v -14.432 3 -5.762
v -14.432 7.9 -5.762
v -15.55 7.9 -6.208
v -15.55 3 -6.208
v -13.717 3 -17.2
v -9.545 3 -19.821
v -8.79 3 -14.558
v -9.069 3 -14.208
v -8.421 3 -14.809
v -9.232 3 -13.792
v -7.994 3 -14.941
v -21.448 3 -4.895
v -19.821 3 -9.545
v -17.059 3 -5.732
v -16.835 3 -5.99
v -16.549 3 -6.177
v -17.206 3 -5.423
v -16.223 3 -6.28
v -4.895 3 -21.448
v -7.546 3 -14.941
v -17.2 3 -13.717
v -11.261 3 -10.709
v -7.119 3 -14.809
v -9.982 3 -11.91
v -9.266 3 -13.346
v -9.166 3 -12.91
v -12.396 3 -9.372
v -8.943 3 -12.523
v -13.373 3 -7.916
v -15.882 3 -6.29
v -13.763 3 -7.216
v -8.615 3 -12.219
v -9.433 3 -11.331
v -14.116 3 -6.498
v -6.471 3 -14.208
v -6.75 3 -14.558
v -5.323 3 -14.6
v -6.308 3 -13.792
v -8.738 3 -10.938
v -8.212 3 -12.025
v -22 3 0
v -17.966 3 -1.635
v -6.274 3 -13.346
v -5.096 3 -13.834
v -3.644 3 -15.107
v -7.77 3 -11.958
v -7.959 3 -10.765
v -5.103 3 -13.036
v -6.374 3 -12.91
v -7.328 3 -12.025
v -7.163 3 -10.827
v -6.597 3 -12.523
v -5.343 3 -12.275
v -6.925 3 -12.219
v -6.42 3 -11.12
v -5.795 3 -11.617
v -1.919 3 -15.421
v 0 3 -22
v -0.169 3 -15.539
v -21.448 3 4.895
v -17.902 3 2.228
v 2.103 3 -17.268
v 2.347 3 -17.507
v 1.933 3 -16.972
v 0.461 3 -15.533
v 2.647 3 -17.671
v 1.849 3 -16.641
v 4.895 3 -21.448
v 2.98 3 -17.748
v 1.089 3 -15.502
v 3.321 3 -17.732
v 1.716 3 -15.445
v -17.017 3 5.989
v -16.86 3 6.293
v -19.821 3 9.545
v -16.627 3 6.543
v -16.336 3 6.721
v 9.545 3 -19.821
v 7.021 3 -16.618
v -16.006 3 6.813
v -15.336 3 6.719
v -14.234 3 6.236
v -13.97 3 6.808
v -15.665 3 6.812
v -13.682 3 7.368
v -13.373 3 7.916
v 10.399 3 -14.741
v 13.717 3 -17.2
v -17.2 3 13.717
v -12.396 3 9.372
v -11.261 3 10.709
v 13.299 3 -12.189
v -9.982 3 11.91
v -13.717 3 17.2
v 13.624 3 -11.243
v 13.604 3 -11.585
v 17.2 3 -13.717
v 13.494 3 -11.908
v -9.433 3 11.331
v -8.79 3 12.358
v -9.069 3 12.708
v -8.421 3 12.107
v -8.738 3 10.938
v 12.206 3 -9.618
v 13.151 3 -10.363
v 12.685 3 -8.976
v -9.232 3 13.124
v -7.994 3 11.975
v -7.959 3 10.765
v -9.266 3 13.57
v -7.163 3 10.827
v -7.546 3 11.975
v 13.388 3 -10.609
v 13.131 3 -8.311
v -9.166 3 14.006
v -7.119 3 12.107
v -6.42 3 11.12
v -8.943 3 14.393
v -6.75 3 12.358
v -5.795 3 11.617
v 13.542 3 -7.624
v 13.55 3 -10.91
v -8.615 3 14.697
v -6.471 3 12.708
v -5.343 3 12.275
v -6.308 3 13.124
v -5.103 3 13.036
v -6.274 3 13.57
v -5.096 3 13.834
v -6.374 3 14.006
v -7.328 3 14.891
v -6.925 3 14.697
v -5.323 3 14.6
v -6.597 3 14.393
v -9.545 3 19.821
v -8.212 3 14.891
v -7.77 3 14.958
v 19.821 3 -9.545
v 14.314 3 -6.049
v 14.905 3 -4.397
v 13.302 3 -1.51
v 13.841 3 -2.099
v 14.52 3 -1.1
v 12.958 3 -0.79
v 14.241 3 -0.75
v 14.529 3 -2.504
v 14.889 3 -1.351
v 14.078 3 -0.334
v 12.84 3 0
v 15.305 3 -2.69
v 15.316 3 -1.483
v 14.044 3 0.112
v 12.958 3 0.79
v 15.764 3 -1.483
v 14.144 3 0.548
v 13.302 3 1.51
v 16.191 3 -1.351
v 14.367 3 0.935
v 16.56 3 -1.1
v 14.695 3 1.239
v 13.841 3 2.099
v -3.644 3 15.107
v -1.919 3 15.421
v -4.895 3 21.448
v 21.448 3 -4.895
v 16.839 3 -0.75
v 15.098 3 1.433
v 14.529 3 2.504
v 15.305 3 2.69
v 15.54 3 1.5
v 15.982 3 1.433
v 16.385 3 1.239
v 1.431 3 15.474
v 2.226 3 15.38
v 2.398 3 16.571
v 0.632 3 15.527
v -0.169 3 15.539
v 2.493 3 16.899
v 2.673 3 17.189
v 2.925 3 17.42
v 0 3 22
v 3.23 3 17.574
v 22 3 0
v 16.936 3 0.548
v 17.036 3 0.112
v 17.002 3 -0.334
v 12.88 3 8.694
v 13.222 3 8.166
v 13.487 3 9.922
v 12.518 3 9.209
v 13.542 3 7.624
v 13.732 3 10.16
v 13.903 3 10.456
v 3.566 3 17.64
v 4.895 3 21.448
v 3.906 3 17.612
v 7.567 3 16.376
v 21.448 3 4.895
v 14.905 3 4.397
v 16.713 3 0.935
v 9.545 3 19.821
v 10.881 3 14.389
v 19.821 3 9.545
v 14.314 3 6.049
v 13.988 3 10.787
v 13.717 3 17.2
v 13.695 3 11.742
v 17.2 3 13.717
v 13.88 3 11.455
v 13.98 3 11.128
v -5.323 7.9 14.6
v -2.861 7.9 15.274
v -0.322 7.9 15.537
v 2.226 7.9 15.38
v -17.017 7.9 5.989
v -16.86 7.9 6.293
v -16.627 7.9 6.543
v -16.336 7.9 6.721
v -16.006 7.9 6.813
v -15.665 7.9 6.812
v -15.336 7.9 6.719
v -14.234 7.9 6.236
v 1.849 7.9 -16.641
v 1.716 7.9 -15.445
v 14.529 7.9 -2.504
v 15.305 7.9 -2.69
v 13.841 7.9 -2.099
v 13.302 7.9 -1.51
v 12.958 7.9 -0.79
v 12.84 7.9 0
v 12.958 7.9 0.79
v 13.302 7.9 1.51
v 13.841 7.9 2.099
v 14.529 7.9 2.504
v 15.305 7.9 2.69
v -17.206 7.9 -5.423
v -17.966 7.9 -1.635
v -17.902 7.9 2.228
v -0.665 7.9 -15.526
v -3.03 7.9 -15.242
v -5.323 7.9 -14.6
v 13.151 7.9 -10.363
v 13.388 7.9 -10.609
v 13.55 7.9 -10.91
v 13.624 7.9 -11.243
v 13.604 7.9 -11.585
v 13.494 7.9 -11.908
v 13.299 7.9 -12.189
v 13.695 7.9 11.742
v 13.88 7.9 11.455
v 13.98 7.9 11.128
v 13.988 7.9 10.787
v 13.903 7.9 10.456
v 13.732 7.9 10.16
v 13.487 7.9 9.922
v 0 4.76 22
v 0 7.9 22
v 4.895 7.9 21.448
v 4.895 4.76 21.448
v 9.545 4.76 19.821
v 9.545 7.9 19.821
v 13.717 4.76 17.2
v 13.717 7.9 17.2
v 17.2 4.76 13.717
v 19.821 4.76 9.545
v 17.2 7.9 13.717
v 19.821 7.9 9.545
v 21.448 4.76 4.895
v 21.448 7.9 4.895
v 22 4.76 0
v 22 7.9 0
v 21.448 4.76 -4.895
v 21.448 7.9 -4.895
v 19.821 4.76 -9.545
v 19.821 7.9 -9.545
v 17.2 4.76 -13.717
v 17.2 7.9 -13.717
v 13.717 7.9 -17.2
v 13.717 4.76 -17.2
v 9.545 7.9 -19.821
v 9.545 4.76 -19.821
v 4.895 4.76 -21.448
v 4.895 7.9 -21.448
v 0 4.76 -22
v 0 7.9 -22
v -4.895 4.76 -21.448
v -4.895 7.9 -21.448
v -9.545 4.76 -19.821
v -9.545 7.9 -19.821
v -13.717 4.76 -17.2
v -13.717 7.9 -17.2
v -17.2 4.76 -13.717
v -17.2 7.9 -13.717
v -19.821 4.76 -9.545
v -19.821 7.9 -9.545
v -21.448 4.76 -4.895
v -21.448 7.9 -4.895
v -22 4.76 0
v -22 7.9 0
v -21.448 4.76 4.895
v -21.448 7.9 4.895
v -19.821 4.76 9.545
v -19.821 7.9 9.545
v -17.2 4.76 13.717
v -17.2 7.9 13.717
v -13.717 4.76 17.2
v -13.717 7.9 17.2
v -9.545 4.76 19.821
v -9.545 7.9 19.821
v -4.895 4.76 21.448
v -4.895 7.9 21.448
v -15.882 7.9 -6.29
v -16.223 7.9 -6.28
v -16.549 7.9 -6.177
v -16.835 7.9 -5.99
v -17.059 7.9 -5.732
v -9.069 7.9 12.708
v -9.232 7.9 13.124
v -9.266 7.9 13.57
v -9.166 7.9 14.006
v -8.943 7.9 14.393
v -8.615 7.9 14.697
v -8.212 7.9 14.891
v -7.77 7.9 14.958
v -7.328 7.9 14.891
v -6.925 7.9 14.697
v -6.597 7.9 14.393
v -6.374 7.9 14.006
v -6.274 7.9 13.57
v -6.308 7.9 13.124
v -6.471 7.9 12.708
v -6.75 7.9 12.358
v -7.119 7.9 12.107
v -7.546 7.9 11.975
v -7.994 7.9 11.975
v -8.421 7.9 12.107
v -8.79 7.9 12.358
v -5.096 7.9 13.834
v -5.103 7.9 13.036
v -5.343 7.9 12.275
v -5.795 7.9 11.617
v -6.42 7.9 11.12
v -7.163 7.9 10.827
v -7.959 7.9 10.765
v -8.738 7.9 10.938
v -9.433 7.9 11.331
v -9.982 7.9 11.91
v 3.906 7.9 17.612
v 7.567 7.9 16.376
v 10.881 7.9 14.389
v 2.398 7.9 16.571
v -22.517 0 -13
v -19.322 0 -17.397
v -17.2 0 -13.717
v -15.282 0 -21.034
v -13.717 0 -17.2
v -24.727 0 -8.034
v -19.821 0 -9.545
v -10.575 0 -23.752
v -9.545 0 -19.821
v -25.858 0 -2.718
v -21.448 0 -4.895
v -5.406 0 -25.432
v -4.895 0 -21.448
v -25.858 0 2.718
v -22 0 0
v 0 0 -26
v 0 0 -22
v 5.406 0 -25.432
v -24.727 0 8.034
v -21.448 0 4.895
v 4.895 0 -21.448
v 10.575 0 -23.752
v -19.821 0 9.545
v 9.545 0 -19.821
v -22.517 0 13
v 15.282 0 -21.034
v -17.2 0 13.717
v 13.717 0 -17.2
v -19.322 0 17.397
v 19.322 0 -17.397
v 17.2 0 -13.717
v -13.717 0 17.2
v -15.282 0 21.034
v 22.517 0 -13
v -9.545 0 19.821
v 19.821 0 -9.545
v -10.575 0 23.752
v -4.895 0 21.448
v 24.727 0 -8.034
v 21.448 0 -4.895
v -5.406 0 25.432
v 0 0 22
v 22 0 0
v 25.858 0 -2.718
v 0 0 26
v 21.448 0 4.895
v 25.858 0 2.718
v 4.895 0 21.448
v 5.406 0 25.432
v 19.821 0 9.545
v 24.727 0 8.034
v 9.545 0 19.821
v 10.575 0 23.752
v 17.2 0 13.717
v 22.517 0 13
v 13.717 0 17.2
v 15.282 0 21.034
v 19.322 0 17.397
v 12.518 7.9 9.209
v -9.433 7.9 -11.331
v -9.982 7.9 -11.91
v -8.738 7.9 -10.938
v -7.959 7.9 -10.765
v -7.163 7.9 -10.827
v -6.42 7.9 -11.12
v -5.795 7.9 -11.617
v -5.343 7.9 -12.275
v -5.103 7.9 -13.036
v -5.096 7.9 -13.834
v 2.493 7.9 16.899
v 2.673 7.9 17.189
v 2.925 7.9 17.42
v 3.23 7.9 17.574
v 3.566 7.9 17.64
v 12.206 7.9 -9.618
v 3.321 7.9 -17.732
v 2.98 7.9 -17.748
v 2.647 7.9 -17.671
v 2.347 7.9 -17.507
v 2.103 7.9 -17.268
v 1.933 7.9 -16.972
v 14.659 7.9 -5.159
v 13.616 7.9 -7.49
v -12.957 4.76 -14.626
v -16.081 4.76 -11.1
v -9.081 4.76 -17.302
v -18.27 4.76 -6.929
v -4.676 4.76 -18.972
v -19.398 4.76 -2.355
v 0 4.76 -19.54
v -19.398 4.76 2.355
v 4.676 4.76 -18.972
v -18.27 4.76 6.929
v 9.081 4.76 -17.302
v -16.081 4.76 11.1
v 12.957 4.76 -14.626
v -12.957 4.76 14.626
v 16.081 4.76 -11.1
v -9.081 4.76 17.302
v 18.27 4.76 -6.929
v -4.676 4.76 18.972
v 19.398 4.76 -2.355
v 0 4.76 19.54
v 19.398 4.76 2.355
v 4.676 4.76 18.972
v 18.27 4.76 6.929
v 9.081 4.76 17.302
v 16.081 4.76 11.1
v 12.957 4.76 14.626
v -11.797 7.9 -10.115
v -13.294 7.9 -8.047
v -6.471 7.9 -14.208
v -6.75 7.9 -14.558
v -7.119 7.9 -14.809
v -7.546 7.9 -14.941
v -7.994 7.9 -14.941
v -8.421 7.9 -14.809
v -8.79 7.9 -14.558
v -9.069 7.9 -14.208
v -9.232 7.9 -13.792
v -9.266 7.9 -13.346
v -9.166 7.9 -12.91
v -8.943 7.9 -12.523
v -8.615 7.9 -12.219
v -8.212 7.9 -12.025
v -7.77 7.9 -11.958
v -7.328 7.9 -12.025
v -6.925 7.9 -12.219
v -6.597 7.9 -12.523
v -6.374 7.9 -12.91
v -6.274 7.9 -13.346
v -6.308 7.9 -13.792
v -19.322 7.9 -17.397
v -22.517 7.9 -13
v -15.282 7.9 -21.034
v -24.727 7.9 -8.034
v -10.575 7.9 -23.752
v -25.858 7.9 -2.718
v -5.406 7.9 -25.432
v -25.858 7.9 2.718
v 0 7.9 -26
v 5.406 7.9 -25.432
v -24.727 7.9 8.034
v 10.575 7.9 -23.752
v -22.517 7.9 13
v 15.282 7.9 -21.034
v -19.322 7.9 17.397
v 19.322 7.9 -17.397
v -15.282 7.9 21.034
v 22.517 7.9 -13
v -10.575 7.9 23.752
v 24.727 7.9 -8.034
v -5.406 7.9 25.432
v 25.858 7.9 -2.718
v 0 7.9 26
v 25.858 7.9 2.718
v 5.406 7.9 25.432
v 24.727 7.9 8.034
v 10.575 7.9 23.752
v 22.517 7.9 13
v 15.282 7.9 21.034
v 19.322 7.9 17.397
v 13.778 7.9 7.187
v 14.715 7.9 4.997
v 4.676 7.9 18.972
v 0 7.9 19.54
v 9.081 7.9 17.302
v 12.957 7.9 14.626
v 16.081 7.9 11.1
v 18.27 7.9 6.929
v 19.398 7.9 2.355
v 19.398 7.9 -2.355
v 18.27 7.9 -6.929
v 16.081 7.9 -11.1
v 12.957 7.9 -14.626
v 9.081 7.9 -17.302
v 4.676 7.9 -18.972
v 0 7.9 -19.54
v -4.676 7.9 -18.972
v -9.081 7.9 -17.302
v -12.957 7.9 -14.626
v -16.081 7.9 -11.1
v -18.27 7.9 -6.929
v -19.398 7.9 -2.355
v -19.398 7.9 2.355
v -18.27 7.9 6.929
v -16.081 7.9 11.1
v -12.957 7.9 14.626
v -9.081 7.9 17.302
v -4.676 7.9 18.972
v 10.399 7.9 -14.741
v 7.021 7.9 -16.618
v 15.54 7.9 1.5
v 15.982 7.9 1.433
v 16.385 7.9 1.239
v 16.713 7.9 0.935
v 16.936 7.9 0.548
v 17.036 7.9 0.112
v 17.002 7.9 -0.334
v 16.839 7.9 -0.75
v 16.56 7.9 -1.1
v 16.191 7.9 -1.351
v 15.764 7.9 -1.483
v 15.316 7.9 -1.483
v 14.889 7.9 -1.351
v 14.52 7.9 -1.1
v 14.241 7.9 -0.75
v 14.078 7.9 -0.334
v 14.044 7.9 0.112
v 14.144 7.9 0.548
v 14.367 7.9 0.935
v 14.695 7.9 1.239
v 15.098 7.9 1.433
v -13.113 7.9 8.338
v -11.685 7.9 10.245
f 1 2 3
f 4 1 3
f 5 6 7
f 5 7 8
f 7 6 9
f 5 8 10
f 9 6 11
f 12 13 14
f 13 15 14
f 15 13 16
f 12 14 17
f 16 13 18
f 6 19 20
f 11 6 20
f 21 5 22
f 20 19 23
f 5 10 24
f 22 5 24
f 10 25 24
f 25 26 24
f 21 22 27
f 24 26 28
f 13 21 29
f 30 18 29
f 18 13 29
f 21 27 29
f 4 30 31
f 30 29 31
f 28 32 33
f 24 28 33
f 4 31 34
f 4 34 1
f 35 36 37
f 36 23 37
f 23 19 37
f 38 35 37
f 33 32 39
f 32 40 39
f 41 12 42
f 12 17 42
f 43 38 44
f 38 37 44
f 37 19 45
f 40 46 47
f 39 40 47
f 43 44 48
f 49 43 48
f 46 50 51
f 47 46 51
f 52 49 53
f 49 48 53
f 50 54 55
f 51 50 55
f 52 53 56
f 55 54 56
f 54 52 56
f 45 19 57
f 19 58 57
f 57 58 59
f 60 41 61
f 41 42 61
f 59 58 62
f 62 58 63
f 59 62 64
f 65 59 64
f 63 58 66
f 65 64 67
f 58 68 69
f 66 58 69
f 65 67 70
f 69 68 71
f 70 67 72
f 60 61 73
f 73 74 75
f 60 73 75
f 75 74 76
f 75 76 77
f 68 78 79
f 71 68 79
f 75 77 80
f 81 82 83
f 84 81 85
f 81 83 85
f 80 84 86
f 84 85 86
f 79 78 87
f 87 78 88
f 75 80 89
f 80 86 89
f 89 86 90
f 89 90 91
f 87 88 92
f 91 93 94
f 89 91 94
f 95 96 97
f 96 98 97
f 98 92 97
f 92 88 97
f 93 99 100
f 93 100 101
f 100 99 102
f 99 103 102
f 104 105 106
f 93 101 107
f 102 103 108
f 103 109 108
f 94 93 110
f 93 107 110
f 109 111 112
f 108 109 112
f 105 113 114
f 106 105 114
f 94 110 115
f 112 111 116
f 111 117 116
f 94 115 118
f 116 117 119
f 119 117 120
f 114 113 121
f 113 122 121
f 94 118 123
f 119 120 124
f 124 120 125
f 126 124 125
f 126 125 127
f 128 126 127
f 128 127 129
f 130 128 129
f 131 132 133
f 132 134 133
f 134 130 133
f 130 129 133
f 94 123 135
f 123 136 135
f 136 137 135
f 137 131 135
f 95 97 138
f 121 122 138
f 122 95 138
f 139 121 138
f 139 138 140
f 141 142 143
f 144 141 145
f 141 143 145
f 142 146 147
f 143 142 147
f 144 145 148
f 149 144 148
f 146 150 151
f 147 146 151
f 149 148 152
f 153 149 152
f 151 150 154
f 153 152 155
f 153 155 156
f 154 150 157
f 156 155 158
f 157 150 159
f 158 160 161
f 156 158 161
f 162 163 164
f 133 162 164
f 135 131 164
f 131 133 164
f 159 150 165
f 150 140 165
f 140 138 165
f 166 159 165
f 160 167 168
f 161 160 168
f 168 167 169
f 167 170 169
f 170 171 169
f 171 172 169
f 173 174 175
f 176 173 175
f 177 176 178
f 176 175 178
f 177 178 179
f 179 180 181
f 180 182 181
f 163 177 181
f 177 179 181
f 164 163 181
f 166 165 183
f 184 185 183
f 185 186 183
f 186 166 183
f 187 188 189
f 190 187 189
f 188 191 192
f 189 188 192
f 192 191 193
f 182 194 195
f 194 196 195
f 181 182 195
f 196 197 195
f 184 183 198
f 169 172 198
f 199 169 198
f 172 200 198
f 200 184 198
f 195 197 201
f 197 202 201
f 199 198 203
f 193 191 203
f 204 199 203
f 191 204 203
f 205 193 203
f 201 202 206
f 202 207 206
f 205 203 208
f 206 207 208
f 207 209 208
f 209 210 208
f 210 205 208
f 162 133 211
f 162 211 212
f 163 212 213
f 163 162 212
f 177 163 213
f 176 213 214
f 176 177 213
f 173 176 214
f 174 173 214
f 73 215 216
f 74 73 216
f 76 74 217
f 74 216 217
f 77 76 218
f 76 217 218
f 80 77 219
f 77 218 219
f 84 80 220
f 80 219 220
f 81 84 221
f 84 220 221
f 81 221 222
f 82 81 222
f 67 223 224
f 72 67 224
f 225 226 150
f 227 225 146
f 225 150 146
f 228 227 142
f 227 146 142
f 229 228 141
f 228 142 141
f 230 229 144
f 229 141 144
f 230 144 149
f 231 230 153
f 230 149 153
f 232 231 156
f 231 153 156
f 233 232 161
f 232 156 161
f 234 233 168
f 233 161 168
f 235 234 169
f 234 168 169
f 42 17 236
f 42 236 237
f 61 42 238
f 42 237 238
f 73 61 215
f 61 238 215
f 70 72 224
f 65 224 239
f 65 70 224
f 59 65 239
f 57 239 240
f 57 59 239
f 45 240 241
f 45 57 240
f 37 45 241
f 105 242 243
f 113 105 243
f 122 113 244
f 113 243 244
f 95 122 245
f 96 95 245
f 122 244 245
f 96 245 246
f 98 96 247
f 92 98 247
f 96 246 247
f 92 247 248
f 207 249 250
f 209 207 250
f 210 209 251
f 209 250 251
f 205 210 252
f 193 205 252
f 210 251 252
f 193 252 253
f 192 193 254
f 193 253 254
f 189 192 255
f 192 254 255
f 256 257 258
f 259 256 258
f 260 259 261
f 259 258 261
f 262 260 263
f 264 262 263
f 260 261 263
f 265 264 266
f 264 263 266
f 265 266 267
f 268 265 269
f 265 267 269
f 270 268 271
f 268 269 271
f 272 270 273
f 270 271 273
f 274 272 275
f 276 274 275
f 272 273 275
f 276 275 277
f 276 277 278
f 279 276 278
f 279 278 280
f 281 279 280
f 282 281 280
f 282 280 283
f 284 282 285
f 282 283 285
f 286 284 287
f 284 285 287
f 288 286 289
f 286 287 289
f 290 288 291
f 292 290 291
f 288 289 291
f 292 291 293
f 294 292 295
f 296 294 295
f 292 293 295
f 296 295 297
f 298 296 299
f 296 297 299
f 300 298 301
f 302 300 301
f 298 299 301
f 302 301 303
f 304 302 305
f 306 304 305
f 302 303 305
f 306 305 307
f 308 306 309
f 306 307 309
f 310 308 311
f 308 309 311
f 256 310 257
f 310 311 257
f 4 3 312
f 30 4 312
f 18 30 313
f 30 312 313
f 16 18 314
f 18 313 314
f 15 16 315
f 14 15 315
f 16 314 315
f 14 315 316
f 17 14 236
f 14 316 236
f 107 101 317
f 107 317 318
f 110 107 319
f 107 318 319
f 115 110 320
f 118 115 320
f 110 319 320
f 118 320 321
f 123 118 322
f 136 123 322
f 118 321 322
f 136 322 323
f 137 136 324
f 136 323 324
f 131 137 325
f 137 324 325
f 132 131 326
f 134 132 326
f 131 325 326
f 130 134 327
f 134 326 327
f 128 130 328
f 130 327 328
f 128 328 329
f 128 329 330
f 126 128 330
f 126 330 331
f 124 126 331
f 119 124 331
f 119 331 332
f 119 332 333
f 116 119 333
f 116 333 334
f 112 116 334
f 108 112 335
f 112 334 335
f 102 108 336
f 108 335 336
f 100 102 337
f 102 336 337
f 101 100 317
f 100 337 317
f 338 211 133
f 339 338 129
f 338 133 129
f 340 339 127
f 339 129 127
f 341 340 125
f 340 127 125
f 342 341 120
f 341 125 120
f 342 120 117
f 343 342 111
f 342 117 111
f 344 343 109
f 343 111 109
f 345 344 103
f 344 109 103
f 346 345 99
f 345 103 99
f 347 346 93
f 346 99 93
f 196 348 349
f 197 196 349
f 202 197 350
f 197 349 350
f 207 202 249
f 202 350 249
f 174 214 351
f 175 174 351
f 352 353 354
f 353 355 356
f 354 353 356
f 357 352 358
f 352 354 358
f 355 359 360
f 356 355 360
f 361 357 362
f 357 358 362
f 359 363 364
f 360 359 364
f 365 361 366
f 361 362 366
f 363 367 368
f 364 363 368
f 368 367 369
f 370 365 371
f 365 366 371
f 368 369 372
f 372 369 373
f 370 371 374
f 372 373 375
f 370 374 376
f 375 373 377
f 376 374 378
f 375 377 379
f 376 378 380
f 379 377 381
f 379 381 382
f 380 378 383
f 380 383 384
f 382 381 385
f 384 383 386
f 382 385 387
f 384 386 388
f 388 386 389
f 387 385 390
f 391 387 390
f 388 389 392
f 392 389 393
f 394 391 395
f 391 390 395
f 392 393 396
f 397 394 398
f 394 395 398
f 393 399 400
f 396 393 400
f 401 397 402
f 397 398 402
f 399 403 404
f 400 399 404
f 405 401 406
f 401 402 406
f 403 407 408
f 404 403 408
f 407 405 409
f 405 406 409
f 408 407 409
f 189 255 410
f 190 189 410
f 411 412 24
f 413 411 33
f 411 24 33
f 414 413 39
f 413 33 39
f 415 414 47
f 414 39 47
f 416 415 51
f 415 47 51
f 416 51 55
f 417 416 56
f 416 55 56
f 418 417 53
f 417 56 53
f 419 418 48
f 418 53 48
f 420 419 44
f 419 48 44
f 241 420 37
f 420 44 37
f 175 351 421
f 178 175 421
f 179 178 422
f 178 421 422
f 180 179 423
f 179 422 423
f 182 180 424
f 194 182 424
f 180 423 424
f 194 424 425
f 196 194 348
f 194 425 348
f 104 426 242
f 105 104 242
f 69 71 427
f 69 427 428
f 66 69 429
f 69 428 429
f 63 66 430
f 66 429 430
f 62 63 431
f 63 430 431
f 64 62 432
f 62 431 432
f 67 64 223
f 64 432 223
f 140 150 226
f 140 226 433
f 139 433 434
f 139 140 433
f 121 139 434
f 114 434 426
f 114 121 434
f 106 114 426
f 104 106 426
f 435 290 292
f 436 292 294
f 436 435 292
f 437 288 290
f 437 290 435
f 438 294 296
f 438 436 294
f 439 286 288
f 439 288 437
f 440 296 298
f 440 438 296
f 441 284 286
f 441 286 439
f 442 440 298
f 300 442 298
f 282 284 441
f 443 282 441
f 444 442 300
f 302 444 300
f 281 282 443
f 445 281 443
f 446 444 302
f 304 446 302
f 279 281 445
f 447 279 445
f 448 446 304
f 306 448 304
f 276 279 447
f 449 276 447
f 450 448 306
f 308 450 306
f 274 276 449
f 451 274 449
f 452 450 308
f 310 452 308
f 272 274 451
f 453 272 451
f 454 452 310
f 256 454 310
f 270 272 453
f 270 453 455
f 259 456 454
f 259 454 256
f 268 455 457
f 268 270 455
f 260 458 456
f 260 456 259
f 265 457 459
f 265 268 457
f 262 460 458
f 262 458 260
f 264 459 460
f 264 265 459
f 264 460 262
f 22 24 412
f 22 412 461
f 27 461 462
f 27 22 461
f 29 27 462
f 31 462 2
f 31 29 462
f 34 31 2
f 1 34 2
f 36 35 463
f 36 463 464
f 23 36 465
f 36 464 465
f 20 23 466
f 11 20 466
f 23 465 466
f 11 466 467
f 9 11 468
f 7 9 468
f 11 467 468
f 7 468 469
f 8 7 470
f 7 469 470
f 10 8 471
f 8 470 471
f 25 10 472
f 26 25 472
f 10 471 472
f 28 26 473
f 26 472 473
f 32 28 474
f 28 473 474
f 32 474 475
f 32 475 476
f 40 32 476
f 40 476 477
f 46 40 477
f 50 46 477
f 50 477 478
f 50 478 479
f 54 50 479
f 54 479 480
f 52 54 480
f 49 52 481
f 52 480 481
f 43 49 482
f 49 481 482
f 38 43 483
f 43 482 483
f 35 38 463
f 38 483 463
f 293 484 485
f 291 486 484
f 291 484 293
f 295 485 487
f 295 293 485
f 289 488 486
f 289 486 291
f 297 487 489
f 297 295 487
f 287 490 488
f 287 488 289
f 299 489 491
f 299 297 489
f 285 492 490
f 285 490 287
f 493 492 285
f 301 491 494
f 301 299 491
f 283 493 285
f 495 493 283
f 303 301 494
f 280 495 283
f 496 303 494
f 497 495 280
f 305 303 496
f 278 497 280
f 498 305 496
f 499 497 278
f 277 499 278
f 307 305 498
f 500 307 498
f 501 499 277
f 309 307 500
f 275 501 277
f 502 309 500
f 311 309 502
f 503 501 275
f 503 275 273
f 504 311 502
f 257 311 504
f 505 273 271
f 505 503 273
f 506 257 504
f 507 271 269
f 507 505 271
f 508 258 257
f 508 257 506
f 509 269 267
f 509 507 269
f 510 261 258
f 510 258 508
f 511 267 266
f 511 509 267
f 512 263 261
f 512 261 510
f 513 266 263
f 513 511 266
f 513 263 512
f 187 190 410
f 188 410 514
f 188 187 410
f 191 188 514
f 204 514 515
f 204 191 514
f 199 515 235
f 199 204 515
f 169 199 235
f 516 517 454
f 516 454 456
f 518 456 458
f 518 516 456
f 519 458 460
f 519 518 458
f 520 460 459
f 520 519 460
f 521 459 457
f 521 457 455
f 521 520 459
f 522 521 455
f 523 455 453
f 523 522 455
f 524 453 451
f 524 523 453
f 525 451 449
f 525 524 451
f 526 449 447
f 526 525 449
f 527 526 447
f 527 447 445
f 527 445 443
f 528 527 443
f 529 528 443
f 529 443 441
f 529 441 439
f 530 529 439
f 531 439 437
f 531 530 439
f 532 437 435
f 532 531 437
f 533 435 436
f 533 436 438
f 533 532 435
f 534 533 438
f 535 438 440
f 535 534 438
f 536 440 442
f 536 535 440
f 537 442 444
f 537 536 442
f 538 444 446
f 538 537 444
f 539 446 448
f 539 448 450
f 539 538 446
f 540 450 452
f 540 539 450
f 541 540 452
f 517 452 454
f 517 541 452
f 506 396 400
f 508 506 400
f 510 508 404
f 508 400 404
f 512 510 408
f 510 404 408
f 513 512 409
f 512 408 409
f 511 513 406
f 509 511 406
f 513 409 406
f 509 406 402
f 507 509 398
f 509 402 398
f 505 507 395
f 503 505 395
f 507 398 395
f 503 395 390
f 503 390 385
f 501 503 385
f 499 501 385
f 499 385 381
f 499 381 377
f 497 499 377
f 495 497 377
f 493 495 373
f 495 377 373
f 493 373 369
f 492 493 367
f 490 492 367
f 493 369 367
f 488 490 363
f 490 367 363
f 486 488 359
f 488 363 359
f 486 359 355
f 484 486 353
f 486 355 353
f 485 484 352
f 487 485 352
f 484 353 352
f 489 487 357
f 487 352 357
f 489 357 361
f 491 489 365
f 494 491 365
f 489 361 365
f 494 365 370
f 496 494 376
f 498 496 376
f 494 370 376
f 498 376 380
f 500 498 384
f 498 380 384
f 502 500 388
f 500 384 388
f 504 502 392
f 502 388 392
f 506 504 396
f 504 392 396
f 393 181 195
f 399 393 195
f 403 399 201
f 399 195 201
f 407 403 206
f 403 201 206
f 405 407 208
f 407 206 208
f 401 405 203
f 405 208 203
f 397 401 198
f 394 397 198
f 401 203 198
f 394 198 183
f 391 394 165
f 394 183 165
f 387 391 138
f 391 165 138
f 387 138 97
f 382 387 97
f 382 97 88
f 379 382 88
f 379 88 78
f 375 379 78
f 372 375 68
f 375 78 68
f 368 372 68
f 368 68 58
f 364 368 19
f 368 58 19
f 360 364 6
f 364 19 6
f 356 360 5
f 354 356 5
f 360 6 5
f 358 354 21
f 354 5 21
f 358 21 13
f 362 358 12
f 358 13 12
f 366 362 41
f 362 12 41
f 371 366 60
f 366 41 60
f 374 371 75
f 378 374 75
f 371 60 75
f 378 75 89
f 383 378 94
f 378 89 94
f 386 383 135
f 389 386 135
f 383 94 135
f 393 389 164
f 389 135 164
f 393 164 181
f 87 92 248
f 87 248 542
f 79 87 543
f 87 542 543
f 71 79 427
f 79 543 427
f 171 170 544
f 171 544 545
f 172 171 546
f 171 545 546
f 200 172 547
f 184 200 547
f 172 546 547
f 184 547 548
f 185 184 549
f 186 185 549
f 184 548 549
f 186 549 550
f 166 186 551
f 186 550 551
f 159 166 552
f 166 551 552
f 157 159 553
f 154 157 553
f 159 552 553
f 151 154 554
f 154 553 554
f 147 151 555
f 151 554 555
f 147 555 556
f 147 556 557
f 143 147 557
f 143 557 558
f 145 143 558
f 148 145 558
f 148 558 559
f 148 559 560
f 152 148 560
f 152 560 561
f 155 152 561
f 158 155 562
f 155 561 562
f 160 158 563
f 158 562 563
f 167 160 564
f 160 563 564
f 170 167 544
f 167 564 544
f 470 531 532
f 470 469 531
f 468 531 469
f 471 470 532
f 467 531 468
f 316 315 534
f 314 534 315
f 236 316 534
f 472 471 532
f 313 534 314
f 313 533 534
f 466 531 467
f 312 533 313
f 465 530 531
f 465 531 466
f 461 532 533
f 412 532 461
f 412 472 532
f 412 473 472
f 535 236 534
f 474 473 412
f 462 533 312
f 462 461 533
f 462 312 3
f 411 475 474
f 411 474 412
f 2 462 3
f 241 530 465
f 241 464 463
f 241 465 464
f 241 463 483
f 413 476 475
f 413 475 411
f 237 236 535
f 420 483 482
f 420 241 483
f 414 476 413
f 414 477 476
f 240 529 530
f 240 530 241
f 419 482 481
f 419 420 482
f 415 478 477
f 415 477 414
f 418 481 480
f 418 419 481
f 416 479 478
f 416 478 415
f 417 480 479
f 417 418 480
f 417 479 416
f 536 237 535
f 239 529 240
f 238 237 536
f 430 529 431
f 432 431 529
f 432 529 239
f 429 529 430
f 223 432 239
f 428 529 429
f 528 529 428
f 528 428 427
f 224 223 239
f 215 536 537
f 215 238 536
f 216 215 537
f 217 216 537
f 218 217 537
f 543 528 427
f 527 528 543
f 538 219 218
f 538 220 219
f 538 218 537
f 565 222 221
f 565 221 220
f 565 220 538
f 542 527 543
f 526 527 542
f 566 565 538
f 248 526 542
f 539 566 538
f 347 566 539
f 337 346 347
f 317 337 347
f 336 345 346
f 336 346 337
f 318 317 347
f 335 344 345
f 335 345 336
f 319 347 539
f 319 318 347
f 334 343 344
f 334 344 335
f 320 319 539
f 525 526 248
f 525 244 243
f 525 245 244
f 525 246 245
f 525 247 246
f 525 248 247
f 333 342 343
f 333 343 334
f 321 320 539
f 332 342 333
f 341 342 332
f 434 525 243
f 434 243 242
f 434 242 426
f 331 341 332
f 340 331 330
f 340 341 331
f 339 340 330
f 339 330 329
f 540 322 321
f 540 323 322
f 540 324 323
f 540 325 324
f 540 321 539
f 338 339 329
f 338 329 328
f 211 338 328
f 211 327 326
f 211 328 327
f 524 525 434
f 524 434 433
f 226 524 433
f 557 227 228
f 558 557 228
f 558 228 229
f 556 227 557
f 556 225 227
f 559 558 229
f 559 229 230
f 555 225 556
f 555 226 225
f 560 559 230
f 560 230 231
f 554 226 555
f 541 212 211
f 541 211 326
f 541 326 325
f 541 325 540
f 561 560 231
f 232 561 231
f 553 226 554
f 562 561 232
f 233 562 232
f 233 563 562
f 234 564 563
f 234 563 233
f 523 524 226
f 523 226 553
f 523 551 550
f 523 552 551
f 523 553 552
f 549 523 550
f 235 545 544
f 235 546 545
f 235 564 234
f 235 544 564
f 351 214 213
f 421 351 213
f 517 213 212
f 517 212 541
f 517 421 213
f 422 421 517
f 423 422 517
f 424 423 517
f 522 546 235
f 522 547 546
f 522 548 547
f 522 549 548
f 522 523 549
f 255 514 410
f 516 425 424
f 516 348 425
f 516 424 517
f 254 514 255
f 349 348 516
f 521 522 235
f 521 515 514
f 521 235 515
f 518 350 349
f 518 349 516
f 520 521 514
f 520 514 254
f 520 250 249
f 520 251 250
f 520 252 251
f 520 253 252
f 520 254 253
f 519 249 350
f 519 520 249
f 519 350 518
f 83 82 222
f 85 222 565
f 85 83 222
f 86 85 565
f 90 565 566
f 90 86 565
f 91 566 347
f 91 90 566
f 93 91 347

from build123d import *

# Parameters (mm, degrees)
SKETCH1_R           = 19.54
SKETCH1_R_2         = 15.54
BOSS_EXTRUDE1_DEPTH = 7.9
SKETCH1_3_R         = 2.7
BOSS_EXTRUDE2_DEPTH = 7.9
SKETCH1_4_R         = 1.5
CUT_EXTRUDE1_DEPTH  = 29.740793308
CUT_EXTRUDE2_DEPTH  = 29.740793308
SKETCH1_6_R         = 1.5
CUT_EXTRUDE5_DEPTH  = 3
CIRPATTERN1_COUNT   = 3
SKETCH2_R           = 26
SKETCH2_R_2         = 19.54
BOSS_EXTRUDE3_DEPTH = 7.9
CUT_EXTRUDE4_START  = 7.9
SKETCH2_3_R         = 22
SKETCH2_3_R_2       = 19.54
CUT_EXTRUDE4_DEPTH  = 3.14
CUT_EXTRUDE6_START  = 3
SKETCH2_4_R         = 22
CUT_EXTRUDE6_DEPTH  = 3


with BuildPart() as part:
    # Sketch1 → Boss-Extrude1 (new body)
    with BuildSketch(Plane(origin=(0, 0, 0), x_dir=(1, 0, 0), z_dir=(0, 1, 0))):
        with Locations(Location((0, 0, 0), (0, 0, 270))):
            Circle(SKETCH1_R)
        with Locations(Location((0, 0, 0), (0, 0, 270))):
            Circle(SKETCH1_R_2, mode=Mode.SUBTRACT)
    extrude(amount=BOSS_EXTRUDE1_DEPTH)

    # Sketch1<3> → Boss-Extrude2 (add)
    with BuildSketch(Plane(origin=(0, 0, 0), x_dir=(1, 0, 0), z_dir=(0, 1, 0))):
        with Locations((15.54, 0)):
            Circle(SKETCH1_3_R)
    boss_extrude2 = extrude(amount=BOSS_EXTRUDE2_DEPTH)

    # Sketch1<4> → Cut-Extrude1 (cut, symmetric)
    with BuildSketch(Plane(origin=(0, 0, 0), x_dir=(1, 0, 0), z_dir=(0, 1, 0))):
        with Locations(Location((15.54, 0, 0), (0, 0, 270))):
            Circle(SKETCH1_4_R)
    cut_extrude1 = extrude(amount=CUT_EXTRUDE1_DEPTH, both=True, mode=Mode.SUBTRACT)

    # Sketch1<5> → Cut-Extrude2 (cut, symmetric)
    with BuildSketch(Plane(origin=(0, 0, 0), x_dir=(1, 0, 0), z_dir=(0, 1, 0))):
        with BuildLine():
            Line((1.84893352, 16.641004923), (1.716044464, 15.444960065))
            ThreePointArc((1.716044464, 15.444960065), (7.546281877, 13.584742538), (12.206193142, 9.617715372))
            Line((12.206193142, 9.617715372), (13.151430585, 10.362503249))
            ThreePointArc((13.151430585, 10.362503249), (13.623726964, 11.24345363), (13.299320972, 12.188915525))
            ThreePointArc((13.299320972, 12.188915525), (8.760291222, 15.770190161), (3.321432407, 17.731601359))
            ThreePointArc((3.321432407, 17.731601359), (2.347317501, 17.507463762), (1.84893352, 16.641004923))
        make_face()
    cut_extrude2 = extrude(amount=CUT_EXTRUDE2_DEPTH, both=True, mode=Mode.SUBTRACT)

    # Sketch1<6> → Cut-Extrude5 (cut)
    with BuildSketch(Plane(origin=(0, 0, 0), x_dir=(1, 0, 0), z_dir=(0, 1, 0))):
        with BuildLine():
            Line((13.541549805, -7.623518144), (14.590196156, -8.213877046))
            ThreePointArc((14.590196156, -8.213877046), (15.584628409, -8.315079224), (16.335293585, -7.655049543))
            ThreePointArc((16.335293585, -7.655049543), (17.48108114, -4.455715676), (18.006537967, -1.098267026))
            ThreePointArc((18.006537967, -1.098267026), (18.24, 0), (18.006537967, 1.098267026))
            ThreePointArc((18.006537967, 1.098267026), (17.48108114, 4.455715676), (16.335293585, 7.655049543))
            ThreePointArc((16.335293585, 7.655049543), (15.584628409, 8.315079224), (14.590196156, 8.213877046))
            Line((14.590196156, 8.213877046), (13.541549805, 7.623518144))
            ThreePointArc((13.541549805, 7.623518144), (14.632931196, 5.231531765), (15.305444015, 2.689792462))
            ThreePointArc((15.305444015, 2.689792462), (12.84, 0), (15.305444015, -2.689792462))
            ThreePointArc((15.305444015, -2.689792462), (14.632931196, -5.231531765), (13.541549805, -7.623518144))
        make_face()
        with Locations(Location((15.54, 0, 0), (0, 0, 270))):
            Circle(SKETCH1_6_R, mode=Mode.SUBTRACT)
    cut_extrude5 = extrude(amount=CUT_EXTRUDE5_DEPTH, mode=Mode.SUBTRACT)

    # CirPattern1: Boss-Extrude2, Cut-Extrude1, Cut-Extrude2, Cut-Extrude5 ×3 about axis
    cirpattern1_axis = Axis((0, 0, 0), (0, 1, 0))
    add([boss_extrude2.rotate(cirpattern1_axis, i * 360 / CIRPATTERN1_COUNT) for i in range(1, CIRPATTERN1_COUNT)])
    add([cut_extrude1.rotate(cirpattern1_axis, i * 360 / CIRPATTERN1_COUNT) for i in range(1, CIRPATTERN1_COUNT)], mode=Mode.SUBTRACT)
    add([cut_extrude2.rotate(cirpattern1_axis, i * 360 / CIRPATTERN1_COUNT) for i in range(1, CIRPATTERN1_COUNT)], mode=Mode.SUBTRACT)
    add([cut_extrude5.rotate(cirpattern1_axis, i * 360 / CIRPATTERN1_COUNT) for i in range(1, CIRPATTERN1_COUNT)], mode=Mode.SUBTRACT)

    # Sketch2 → Boss-Extrude3 (add)
    with BuildSketch(Plane(origin=(0, 0, 0), x_dir=(1, 0, 0), z_dir=(0, 1, 0))):
        with Locations(Location((0, 0, 0), (0, 0, 270))):
            Circle(SKETCH2_R)
        Circle(SKETCH2_R_2, mode=Mode.SUBTRACT)
    extrude(amount=BOSS_EXTRUDE3_DEPTH)

    # Sketch2<3> → Cut-Extrude4 (cut)
    with BuildSketch(Plane(origin=(0, 0, 0), x_dir=(1, 0, 0), z_dir=(0, 1, 0)).offset(CUT_EXTRUDE4_START)):
        with Locations(Location((0, 0, 0), (0, 0, 270))):
            Circle(SKETCH2_3_R)
        with Locations(Location((0, 0, 0), (0, 0, 270))):
            Circle(SKETCH2_3_R_2, mode=Mode.SUBTRACT)
    extrude(amount=-CUT_EXTRUDE4_DEPTH, mode=Mode.SUBTRACT)

    # Sketch2<4> → Cut-Extrude6 (cut)
    with BuildSketch(Plane(origin=(0, 0, 0), x_dir=(1, 0, 0), z_dir=(0, 1, 0)).offset(CUT_EXTRUDE6_START)):
        with Locations(Location((0, 0, 0), (0, 0, 270))):
            Circle(SKETCH2_4_R)
    extrude(amount=-CUT_EXTRUDE6_DEPTH, mode=Mode.SUBTRACT)


solid = part.part
